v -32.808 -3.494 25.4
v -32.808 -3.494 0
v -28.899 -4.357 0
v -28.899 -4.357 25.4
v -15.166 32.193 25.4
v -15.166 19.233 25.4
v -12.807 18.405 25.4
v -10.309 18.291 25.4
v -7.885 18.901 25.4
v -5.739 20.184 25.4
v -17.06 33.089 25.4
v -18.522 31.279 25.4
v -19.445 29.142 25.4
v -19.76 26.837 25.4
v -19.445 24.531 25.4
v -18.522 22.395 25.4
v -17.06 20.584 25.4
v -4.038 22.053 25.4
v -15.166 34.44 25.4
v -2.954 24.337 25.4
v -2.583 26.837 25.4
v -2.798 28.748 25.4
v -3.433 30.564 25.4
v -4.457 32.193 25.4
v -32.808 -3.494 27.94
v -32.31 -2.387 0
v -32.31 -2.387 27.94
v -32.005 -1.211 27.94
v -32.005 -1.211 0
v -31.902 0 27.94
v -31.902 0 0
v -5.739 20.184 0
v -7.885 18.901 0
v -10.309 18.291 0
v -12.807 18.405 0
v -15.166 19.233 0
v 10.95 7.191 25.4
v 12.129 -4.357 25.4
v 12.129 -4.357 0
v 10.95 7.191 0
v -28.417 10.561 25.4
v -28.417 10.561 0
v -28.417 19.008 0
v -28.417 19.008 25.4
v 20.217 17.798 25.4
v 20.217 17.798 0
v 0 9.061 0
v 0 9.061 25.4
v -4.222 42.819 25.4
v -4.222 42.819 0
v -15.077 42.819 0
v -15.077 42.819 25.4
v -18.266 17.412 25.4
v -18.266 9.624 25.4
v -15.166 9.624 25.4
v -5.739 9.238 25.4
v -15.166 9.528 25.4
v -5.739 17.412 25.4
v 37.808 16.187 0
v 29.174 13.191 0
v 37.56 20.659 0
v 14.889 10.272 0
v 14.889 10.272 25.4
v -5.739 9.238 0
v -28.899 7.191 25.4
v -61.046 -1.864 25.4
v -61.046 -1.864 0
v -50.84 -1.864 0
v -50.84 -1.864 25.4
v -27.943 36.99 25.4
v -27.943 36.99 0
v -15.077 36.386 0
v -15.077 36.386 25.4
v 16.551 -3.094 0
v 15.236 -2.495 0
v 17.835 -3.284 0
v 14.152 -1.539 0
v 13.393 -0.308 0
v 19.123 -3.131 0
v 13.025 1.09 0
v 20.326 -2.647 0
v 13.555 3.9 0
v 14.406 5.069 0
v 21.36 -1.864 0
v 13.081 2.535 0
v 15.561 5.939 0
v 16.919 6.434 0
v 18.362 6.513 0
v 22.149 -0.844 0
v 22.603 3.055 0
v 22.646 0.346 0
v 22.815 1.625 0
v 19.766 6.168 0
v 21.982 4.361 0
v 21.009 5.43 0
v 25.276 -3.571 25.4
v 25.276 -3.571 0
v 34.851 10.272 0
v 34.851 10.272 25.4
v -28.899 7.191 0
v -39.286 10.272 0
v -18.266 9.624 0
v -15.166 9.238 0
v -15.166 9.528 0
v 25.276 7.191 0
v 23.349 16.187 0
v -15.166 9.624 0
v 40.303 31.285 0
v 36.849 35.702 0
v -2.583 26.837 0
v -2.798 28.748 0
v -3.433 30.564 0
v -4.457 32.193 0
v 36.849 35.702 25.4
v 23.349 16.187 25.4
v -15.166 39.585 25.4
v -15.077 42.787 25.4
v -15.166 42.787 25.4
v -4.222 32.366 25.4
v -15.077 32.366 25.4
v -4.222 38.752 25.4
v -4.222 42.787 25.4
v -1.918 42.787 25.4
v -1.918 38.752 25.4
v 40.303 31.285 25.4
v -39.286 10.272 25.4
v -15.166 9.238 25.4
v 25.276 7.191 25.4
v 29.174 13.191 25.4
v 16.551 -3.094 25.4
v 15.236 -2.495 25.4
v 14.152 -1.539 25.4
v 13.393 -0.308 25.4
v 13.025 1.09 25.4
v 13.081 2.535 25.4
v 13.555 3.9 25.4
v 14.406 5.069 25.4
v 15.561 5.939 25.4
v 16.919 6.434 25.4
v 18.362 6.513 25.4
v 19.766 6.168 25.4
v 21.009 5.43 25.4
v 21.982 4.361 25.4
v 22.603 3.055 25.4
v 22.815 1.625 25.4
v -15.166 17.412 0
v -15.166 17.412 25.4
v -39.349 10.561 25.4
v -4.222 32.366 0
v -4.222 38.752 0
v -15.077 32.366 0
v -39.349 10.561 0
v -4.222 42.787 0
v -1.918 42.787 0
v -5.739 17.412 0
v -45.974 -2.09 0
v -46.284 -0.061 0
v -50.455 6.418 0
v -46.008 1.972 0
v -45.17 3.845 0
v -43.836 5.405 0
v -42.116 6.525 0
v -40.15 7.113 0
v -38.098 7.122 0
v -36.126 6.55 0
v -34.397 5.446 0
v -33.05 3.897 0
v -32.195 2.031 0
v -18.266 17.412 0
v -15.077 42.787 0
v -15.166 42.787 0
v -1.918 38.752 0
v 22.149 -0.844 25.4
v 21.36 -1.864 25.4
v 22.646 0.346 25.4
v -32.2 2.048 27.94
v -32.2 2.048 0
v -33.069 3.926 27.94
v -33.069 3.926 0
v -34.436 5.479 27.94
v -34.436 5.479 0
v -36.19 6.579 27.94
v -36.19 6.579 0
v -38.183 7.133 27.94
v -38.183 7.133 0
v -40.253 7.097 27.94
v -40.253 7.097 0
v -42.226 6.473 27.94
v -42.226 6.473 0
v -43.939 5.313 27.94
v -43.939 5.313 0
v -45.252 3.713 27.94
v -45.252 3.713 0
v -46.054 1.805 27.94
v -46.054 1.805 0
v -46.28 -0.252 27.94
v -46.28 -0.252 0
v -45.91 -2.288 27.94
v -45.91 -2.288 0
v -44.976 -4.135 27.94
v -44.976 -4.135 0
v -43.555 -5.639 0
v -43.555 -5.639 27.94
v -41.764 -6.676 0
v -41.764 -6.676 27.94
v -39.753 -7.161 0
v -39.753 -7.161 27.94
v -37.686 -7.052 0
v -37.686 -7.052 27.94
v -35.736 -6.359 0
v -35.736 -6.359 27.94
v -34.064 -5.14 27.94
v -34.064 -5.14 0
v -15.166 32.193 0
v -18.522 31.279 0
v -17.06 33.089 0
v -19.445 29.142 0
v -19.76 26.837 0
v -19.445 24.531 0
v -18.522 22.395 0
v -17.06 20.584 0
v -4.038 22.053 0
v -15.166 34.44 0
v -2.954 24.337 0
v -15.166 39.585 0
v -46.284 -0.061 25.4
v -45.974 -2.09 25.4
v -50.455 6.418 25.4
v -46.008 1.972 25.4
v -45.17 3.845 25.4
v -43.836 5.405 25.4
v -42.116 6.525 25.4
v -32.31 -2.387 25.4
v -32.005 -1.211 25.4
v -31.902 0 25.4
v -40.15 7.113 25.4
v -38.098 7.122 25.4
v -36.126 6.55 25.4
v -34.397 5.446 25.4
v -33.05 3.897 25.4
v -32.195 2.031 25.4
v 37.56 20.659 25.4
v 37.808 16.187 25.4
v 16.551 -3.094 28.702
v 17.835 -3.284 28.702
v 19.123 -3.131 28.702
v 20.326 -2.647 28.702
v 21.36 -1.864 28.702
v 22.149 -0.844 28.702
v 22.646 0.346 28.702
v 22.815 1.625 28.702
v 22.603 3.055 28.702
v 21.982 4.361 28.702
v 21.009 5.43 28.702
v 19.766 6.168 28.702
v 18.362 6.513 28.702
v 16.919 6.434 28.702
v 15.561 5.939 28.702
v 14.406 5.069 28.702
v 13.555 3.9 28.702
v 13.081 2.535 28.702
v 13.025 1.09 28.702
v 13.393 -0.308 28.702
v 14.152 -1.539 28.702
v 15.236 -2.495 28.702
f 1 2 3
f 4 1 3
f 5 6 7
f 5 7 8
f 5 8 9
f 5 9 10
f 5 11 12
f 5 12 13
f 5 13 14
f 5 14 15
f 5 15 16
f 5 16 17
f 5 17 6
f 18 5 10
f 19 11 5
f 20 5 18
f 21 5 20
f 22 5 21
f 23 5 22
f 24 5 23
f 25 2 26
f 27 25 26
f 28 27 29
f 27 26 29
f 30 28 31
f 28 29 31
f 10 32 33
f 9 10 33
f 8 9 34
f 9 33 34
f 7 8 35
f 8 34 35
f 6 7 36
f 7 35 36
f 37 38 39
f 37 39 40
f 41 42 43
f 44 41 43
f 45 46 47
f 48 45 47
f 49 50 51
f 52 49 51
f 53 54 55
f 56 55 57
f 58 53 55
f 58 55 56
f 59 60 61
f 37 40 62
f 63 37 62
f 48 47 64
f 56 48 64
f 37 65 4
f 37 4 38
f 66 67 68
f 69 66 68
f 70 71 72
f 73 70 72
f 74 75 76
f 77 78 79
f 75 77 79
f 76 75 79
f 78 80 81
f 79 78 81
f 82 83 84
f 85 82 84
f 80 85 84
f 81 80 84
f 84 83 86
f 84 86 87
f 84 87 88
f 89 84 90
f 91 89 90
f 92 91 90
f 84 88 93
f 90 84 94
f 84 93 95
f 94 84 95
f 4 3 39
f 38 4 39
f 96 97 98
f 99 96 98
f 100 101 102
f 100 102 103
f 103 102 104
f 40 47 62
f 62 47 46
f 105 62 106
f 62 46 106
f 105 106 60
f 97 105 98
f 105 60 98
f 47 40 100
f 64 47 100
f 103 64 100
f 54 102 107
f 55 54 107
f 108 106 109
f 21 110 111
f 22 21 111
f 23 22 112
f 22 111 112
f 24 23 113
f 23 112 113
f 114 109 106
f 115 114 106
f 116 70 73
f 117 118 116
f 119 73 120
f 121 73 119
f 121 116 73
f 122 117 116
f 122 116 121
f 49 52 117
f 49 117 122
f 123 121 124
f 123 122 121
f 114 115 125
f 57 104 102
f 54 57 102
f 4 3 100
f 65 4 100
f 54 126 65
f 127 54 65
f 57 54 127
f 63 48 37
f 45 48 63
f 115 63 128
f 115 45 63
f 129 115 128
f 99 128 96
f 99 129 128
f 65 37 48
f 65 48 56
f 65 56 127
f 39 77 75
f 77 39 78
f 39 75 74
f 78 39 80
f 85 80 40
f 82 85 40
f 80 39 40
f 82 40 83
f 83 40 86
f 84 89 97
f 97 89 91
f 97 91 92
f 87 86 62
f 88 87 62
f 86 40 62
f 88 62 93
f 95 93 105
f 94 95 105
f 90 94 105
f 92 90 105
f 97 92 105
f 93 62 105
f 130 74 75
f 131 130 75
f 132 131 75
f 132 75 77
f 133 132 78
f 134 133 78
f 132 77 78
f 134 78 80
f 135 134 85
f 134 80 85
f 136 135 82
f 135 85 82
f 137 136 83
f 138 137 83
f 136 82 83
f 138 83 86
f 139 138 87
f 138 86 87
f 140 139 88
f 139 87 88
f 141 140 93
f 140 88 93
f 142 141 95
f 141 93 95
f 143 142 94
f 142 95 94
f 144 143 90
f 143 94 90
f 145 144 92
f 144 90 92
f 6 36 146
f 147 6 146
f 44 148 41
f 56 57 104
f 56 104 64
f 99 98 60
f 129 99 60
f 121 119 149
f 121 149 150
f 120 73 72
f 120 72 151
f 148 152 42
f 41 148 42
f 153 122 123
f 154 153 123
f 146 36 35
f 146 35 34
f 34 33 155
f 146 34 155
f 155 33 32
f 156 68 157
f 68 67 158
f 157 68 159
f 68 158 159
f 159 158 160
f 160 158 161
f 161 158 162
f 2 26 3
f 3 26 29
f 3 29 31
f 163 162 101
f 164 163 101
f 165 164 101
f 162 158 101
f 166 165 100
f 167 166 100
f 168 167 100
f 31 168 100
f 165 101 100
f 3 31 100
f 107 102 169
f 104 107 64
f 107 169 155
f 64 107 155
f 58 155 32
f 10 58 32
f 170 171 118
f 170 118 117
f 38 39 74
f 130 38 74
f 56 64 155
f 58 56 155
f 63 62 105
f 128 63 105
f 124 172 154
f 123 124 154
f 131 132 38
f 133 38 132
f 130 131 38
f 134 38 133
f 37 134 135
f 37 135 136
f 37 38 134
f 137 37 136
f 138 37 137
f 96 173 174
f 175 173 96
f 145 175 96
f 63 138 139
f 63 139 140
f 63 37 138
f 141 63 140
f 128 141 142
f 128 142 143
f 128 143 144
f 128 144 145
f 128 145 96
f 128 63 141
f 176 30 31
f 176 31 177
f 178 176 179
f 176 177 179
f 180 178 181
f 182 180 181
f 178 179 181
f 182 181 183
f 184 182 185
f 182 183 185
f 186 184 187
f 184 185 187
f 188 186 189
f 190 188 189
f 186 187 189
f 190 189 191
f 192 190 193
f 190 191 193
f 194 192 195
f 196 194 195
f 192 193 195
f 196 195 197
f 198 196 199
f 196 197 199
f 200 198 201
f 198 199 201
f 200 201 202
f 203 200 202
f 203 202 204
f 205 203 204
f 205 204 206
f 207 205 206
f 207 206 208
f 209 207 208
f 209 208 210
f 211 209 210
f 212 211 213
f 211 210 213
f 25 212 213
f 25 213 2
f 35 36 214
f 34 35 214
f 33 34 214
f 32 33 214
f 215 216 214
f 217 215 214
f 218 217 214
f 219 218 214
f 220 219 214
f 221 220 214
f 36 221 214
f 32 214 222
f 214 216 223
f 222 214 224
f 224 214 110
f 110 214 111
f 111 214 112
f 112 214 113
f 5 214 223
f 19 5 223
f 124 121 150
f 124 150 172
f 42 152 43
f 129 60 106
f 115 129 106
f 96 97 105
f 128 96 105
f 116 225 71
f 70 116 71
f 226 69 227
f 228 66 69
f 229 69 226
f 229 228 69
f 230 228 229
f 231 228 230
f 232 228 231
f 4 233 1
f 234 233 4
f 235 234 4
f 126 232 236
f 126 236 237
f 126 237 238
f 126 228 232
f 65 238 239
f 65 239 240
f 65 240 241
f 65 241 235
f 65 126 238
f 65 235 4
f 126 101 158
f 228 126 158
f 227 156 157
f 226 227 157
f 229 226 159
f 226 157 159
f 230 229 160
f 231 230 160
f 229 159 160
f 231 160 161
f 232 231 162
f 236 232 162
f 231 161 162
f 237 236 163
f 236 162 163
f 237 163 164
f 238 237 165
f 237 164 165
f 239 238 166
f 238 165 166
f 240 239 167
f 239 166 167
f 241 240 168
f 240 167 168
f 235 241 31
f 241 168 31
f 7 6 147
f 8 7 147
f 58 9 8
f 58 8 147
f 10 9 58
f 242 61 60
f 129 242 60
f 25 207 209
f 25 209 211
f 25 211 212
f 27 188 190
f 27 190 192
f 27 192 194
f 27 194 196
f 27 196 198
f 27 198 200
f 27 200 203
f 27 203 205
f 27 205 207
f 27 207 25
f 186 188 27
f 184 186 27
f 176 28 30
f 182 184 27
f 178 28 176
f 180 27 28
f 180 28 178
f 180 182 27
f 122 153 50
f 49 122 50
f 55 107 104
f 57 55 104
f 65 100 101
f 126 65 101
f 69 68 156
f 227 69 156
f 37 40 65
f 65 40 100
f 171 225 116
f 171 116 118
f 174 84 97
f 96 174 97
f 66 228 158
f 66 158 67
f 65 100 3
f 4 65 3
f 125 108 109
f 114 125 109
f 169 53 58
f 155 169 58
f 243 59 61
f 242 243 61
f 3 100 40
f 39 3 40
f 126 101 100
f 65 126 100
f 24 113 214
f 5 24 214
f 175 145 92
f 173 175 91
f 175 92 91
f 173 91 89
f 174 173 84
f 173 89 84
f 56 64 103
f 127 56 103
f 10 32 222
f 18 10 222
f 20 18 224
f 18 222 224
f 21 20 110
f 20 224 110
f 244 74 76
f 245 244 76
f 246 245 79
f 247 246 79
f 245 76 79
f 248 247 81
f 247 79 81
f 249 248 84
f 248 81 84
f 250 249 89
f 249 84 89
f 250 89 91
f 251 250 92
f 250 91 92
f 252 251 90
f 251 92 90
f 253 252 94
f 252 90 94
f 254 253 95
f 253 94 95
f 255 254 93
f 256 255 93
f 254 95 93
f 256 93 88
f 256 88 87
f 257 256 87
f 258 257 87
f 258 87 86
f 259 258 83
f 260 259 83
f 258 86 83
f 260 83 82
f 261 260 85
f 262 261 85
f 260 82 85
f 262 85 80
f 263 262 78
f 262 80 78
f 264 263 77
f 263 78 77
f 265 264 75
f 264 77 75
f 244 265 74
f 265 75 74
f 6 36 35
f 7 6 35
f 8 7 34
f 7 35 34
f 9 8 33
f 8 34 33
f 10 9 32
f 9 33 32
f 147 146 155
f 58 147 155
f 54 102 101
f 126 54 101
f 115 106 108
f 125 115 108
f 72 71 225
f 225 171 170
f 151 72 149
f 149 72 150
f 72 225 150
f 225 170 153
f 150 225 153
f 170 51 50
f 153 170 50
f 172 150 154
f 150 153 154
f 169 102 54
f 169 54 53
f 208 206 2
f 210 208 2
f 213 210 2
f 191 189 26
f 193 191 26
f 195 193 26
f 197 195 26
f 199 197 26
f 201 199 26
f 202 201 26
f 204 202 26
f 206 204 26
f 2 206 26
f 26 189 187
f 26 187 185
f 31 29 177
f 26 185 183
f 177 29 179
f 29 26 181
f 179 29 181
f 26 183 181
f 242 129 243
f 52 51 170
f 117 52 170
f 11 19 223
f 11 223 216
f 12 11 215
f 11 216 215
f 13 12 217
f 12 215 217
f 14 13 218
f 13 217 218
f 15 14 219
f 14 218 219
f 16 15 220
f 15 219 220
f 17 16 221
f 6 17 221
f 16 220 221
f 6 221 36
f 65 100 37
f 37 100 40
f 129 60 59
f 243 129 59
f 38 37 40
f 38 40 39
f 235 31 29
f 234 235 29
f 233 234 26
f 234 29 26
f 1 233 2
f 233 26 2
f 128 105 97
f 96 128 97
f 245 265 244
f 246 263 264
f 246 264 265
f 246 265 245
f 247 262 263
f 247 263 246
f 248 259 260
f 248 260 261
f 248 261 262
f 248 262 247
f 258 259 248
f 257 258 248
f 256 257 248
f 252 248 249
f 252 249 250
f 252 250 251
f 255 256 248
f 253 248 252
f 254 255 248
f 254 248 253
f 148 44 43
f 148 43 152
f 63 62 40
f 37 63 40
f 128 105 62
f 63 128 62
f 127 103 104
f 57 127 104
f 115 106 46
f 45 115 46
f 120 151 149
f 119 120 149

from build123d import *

# Parameters (mm, degrees)
F1_DEPTH  = 25.4
F2_DEPTH  = 27.94
F3_DEPTH  = 25.4
F4_DEPTH  = 25.4
F5_DEPTH  = 25.4
F6_DEPTH  = 25.4
F0_W      = 3.0998642863
F0_H      = 7.7887267968
F7_DEPTH  = 25.4
F8_DEPTH  = 25.4
F9_DEPTH  = 25.4
F11_DEPTH = 25.4
F0_W_2    = 13.2477991283
F0_H_2    = 4.0352344513
F13_DEPTH = 25.4
F14_DEPTH = 25.4
F15_DEPTH = 25.4
F16_DEPTH = 25.4
F17_DEPTH = 25.4
F19_DEPTH = 25.4
F20_DEPTH = 25.4
F21_DEPTH = 3.302


with BuildPart() as f1:
    # F0 (on Top) → F1 (new body)
    with BuildSketch(Plane.XY):
        Polygon((10.949794203, 7.1909739636), (-28.8991834968, 7.1909739636), (-28.8991834968, -4.3570683338), (12.1288569644, -4.3570683338), align=None)
    extrude(amount=F1_DEPTH)


with BuildPart() as f2:
    # F0 (on Top) → F2 (new body)
    with BuildSketch(Plane.XY):
        with BuildLine():
            ThreePointArc((-45.9738142885, -2.0900922262), (-39.8560342132, -7.1504074768), (-32.8084771592, -3.4944584816))
            ThreePointArc((-32.8084771592, -3.4944584816), (-32.1325414098, -1.8050186233), (-31.9023155607, 0))
            ThreePointArc((-31.9023155607, 0), (-40.1498007901, 7.1129382459), (-45.9738142885, -2.0900922262))
        make_face()
    extrude(amount=F2_DEPTH)


with BuildPart() as f3:
    # F0 (on Top) → F3 (new body)
    with BuildSketch(Plane.XY):
        with BuildLine():
            Line((-28.8991834968, -4.3570683338), (-28.8991834968, 7.1909739636))
            Line((-28.8991834968, 7.1909739636), (-39.2858572304, 10.2715240791))
            Line((-39.2858572304, 10.2715240791), (-50.4545979202, 6.417769473))
            Line((-50.4545979202, 6.417769473), (-50.8397258818, -1.8638069741))
            Line((-50.8397258818, -1.8638069741), (-45.9738142885, -2.0900922262))
            ThreePointArc((-45.9738142885, -2.0900922262), (-40.1498007901, 7.1129382459), (-31.9023155607, 0))
            ThreePointArc((-31.9023155607, 0), (-32.1325414098, -1.8050186233), (-32.8084771592, -3.4944584816))
            Line((-32.8084771592, -3.4944584816), (-28.8991834968, -4.3570683338))
        make_face()
    extrude(amount=F3_DEPTH)

    # F0 (on Top) → F4 (join)
    with BuildSketch(Plane.XY):
        Polygon((-50.8397258818, -1.8638069741), (-50.4545979202, 6.417769473), (-61.0456392169, -1.8638069741), align=None)
    extrude(amount=F4_DEPTH)


with BuildPart() as f5:
    # F0 (on Top) → F5 (new body)
    with BuildSketch(Plane.XY):
        Polygon((-39.2858572304, 10.2715240791), (-28.8991834968, 7.1909739636), (10.949794203, 7.1909739636), (14.8894104945, 10.2715240791), (25.2760842281, 7.1909739636), (25.2760842281, -3.5705855116), (34.8514616489, 10.2715240791), (29.173970462, 13.1911956168), (23.3488607793, 16.1867805299), (20.2165637165, 17.7975762635), (0, 9.0607940381), (-5.7390695111, 9.2376633838), (-15.1657452807, 9.2376633838), (-15.1657452807, 9.5281791151), (-18.265609567, 9.6237121919), align=None)
    extrude(amount=F5_DEPTH)



with BuildPart() as f6:
    # F0 (on Top) → F6 (new body)
    with BuildSketch(Plane.XY):
        Polygon((-15.1657452807, 9.6237121919), (-15.1657452807, 9.5281791151), (-5.7390695111, 9.2376633838), (-5.7390695111, 17.4124389887), (-15.1657452807, 17.4124389887), align=None)
    extrude(amount=F6_DEPTH)


with BuildPart() as f5_1:
    add(f5.part)

    add(f6.part)  # F7 merges F6
    # F0 (on Top) → F7 (join)
    with BuildSketch(Plane.XY):
        with Locations((-16.7156774238, 13.5180755903)):
            Rectangle(F0_W, F0_H)
    extrude(amount=F7_DEPTH)


with BuildPart() as f8:
    # F0 (on Top) → F8 (new body)
    with BuildSketch(Plane.XY):
        with BuildLine():
            ThreePointArc((-15.1657452807, 34.4403494642), (-19.7603510768, 26.836739853), (-15.1657452807, 19.2331302418))
            Line((-15.1657452807, 19.2331302418), (-15.1657452807, 20.1840243747))
            Line((-15.1657452807, 20.1840243747), (-5.7390695111, 20.1840243747))
            ThreePointArc((-5.7390695111, 20.1840243747), (-3.4116930349, 23.1549496233), (-2.5825375616, 26.836739853))
            ThreePointArc((-2.5825375616, 26.836739853), (-3.064720049, 29.6740521196), (-4.4571279199, 32.192790131))
            Line((-4.4571279199, 32.192790131), (-15.1657452807, 32.192790131))
            Line((-15.1657452807, 32.192790131), (-15.1657452807, 34.4403494642))
        make_face()
    extrude(amount=F8_DEPTH)

    # F0 (on Top) → F19 (join)
    with BuildSketch(Plane.XY):
        with BuildLine():
            Line((-15.1657452807, 20.1840243747), (-15.1657452807, 19.2331302418))
            ThreePointArc((-15.1657452807, 19.2331302418), (-10.3094327125, 18.2911997718), (-5.7390695111, 20.1840243747))
            Line((-5.7390695111, 20.1840243747), (-15.1657452807, 20.1840243747))
        make_face()
    extrude(amount=F19_DEPTH)


with BuildPart() as f9:
    # F0 (on Top) → F9 (new body)
    with BuildSketch(Plane.XY):
        with BuildLine():
            ThreePointArc((22.8153576644, 1.6250861809), (14.9515711294, 5.5463628324), (16.551499587, -3.0939946935))
            ThreePointArc((16.551499587, -3.0939946935), (19.1226476258, -3.1312880436), (21.3599863954, -1.8638069741))
            ThreePointArc((21.3599863954, -1.8638069741), (22.4369303339, -0.2650514449), (22.8153576644, 1.6250861809))
        make_face()
    extrude(amount=F9_DEPTH)

    # F21 (add): a face of the model
    f21_faces = [f9.faces().sort_by_distance(p)[0] for p in [
        (17.9057922214, 1.6250861809, 25.4),
    ]]
    extrude(f21_faces, amount=F21_DEPTH)


with BuildPart() as f11:
    # F10 (on face) → F11 (new body)
    with BuildSketch(Plane.XY):
        Polygon((-28.4170620143, 10.5609092861), (-28.4170620143, 19.0082788467), (-39.3489524722, 10.5609092861), align=None)
    extrude(amount=F11_DEPTH)


with BuildPart() as f13:
    # F0 (on Top) → F13 (new body)
    with BuildSketch(Plane.XY):
        with Locations((-8.5418457165, 40.7694429159)):
            Rectangle(F0_W_2, F0_H_2)
    extrude(amount=F13_DEPTH)

    # F12 (on Top) → F14 (join)
    with BuildSketch(Plane.XY):
        Polygon((-27.9431901872, 36.9895473123), (-15.0772612542, 36.3864563406), (-15.0772612542, 32.3658548295), (-4.2216335423, 32.3658548295), (-4.2216335423, 42.8194217384), (-15.0772612542, 42.8194217384), (-15.0772612542, 39.6029390395), align=None)
    extrude(amount=F14_DEPTH)


with BuildPart() as f15:
    # F0 (on Top) → F15 (new body)
    with BuildSketch(Plane.XY):
        with BuildLine():
            Line((14.8894104945, 10.2715240791), (10.949794203, 7.1909739636))
            Line((10.949794203, 7.1909739636), (12.1288569644, -4.3570683338))
            Line((12.1288569644, -4.3570683338), (16.551499587, -3.0939946935))
            ThreePointArc((16.551499587, -3.0939946935), (14.9515711294, 5.5463628324), (22.8153576644, 1.6250861809))
            ThreePointArc((22.8153576644, 1.6250861809), (22.4369303339, -0.2650514449), (21.3599863954, -1.8638069741))
            Line((21.3599863954, -1.8638069741), (25.2760842281, -3.5705855116))
            Line((25.2760842281, -3.5705855116), (25.2760842281, 7.1909739636))
            Line((25.2760842281, 7.1909739636), (14.8894104945, 10.2715240791))
        make_face()
    extrude(amount=F15_DEPTH)


with BuildPart() as f16:
    # F0 (on Top) → F16 (new body)
    with BuildSketch(Plane.XY):
        Polygon((36.8486594463, 35.7020105192), (23.3488607793, 16.1867805299), (40.302815299, 31.2846018876), align=None)
    extrude(amount=F16_DEPTH)


with BuildPart() as f17:
    # F0 (on Top) → F17 (new body)
    with BuildSketch(Plane.XY):
        Polygon((37.5598161976, 20.6589519271), (29.173970462, 13.1911956168), (37.8081924042, 16.1867805299), align=None)
    extrude(amount=F17_DEPTH)


with BuildPart() as f20:
    # F18 (on face) → F20 (new body)
    with BuildSketch(Plane.XY):
        with BuildLine():
            ThreePointArc((-5.7390695111, 20.1840243747), (-10.3094327125, 18.2911997718), (-15.1657452807, 19.2331302418))
            Line((-15.1657452807, 19.2331302418), (-15.1657452807, 17.4124389887))
            Line((-15.1657452807, 17.4124389887), (-5.7390695111, 17.4124389887))
            Line((-5.7390695111, 17.4124389887), (-5.7390695111, 20.1840243747))
        make_face()
    extrude(amount=F20_DEPTH)


solid = Compound([f1.part, f2.part, f3.part, f5_1.part, f8.part, f9.part, f11.part, f13.part, f15.part, f16.part, f17.part, f20.part])
